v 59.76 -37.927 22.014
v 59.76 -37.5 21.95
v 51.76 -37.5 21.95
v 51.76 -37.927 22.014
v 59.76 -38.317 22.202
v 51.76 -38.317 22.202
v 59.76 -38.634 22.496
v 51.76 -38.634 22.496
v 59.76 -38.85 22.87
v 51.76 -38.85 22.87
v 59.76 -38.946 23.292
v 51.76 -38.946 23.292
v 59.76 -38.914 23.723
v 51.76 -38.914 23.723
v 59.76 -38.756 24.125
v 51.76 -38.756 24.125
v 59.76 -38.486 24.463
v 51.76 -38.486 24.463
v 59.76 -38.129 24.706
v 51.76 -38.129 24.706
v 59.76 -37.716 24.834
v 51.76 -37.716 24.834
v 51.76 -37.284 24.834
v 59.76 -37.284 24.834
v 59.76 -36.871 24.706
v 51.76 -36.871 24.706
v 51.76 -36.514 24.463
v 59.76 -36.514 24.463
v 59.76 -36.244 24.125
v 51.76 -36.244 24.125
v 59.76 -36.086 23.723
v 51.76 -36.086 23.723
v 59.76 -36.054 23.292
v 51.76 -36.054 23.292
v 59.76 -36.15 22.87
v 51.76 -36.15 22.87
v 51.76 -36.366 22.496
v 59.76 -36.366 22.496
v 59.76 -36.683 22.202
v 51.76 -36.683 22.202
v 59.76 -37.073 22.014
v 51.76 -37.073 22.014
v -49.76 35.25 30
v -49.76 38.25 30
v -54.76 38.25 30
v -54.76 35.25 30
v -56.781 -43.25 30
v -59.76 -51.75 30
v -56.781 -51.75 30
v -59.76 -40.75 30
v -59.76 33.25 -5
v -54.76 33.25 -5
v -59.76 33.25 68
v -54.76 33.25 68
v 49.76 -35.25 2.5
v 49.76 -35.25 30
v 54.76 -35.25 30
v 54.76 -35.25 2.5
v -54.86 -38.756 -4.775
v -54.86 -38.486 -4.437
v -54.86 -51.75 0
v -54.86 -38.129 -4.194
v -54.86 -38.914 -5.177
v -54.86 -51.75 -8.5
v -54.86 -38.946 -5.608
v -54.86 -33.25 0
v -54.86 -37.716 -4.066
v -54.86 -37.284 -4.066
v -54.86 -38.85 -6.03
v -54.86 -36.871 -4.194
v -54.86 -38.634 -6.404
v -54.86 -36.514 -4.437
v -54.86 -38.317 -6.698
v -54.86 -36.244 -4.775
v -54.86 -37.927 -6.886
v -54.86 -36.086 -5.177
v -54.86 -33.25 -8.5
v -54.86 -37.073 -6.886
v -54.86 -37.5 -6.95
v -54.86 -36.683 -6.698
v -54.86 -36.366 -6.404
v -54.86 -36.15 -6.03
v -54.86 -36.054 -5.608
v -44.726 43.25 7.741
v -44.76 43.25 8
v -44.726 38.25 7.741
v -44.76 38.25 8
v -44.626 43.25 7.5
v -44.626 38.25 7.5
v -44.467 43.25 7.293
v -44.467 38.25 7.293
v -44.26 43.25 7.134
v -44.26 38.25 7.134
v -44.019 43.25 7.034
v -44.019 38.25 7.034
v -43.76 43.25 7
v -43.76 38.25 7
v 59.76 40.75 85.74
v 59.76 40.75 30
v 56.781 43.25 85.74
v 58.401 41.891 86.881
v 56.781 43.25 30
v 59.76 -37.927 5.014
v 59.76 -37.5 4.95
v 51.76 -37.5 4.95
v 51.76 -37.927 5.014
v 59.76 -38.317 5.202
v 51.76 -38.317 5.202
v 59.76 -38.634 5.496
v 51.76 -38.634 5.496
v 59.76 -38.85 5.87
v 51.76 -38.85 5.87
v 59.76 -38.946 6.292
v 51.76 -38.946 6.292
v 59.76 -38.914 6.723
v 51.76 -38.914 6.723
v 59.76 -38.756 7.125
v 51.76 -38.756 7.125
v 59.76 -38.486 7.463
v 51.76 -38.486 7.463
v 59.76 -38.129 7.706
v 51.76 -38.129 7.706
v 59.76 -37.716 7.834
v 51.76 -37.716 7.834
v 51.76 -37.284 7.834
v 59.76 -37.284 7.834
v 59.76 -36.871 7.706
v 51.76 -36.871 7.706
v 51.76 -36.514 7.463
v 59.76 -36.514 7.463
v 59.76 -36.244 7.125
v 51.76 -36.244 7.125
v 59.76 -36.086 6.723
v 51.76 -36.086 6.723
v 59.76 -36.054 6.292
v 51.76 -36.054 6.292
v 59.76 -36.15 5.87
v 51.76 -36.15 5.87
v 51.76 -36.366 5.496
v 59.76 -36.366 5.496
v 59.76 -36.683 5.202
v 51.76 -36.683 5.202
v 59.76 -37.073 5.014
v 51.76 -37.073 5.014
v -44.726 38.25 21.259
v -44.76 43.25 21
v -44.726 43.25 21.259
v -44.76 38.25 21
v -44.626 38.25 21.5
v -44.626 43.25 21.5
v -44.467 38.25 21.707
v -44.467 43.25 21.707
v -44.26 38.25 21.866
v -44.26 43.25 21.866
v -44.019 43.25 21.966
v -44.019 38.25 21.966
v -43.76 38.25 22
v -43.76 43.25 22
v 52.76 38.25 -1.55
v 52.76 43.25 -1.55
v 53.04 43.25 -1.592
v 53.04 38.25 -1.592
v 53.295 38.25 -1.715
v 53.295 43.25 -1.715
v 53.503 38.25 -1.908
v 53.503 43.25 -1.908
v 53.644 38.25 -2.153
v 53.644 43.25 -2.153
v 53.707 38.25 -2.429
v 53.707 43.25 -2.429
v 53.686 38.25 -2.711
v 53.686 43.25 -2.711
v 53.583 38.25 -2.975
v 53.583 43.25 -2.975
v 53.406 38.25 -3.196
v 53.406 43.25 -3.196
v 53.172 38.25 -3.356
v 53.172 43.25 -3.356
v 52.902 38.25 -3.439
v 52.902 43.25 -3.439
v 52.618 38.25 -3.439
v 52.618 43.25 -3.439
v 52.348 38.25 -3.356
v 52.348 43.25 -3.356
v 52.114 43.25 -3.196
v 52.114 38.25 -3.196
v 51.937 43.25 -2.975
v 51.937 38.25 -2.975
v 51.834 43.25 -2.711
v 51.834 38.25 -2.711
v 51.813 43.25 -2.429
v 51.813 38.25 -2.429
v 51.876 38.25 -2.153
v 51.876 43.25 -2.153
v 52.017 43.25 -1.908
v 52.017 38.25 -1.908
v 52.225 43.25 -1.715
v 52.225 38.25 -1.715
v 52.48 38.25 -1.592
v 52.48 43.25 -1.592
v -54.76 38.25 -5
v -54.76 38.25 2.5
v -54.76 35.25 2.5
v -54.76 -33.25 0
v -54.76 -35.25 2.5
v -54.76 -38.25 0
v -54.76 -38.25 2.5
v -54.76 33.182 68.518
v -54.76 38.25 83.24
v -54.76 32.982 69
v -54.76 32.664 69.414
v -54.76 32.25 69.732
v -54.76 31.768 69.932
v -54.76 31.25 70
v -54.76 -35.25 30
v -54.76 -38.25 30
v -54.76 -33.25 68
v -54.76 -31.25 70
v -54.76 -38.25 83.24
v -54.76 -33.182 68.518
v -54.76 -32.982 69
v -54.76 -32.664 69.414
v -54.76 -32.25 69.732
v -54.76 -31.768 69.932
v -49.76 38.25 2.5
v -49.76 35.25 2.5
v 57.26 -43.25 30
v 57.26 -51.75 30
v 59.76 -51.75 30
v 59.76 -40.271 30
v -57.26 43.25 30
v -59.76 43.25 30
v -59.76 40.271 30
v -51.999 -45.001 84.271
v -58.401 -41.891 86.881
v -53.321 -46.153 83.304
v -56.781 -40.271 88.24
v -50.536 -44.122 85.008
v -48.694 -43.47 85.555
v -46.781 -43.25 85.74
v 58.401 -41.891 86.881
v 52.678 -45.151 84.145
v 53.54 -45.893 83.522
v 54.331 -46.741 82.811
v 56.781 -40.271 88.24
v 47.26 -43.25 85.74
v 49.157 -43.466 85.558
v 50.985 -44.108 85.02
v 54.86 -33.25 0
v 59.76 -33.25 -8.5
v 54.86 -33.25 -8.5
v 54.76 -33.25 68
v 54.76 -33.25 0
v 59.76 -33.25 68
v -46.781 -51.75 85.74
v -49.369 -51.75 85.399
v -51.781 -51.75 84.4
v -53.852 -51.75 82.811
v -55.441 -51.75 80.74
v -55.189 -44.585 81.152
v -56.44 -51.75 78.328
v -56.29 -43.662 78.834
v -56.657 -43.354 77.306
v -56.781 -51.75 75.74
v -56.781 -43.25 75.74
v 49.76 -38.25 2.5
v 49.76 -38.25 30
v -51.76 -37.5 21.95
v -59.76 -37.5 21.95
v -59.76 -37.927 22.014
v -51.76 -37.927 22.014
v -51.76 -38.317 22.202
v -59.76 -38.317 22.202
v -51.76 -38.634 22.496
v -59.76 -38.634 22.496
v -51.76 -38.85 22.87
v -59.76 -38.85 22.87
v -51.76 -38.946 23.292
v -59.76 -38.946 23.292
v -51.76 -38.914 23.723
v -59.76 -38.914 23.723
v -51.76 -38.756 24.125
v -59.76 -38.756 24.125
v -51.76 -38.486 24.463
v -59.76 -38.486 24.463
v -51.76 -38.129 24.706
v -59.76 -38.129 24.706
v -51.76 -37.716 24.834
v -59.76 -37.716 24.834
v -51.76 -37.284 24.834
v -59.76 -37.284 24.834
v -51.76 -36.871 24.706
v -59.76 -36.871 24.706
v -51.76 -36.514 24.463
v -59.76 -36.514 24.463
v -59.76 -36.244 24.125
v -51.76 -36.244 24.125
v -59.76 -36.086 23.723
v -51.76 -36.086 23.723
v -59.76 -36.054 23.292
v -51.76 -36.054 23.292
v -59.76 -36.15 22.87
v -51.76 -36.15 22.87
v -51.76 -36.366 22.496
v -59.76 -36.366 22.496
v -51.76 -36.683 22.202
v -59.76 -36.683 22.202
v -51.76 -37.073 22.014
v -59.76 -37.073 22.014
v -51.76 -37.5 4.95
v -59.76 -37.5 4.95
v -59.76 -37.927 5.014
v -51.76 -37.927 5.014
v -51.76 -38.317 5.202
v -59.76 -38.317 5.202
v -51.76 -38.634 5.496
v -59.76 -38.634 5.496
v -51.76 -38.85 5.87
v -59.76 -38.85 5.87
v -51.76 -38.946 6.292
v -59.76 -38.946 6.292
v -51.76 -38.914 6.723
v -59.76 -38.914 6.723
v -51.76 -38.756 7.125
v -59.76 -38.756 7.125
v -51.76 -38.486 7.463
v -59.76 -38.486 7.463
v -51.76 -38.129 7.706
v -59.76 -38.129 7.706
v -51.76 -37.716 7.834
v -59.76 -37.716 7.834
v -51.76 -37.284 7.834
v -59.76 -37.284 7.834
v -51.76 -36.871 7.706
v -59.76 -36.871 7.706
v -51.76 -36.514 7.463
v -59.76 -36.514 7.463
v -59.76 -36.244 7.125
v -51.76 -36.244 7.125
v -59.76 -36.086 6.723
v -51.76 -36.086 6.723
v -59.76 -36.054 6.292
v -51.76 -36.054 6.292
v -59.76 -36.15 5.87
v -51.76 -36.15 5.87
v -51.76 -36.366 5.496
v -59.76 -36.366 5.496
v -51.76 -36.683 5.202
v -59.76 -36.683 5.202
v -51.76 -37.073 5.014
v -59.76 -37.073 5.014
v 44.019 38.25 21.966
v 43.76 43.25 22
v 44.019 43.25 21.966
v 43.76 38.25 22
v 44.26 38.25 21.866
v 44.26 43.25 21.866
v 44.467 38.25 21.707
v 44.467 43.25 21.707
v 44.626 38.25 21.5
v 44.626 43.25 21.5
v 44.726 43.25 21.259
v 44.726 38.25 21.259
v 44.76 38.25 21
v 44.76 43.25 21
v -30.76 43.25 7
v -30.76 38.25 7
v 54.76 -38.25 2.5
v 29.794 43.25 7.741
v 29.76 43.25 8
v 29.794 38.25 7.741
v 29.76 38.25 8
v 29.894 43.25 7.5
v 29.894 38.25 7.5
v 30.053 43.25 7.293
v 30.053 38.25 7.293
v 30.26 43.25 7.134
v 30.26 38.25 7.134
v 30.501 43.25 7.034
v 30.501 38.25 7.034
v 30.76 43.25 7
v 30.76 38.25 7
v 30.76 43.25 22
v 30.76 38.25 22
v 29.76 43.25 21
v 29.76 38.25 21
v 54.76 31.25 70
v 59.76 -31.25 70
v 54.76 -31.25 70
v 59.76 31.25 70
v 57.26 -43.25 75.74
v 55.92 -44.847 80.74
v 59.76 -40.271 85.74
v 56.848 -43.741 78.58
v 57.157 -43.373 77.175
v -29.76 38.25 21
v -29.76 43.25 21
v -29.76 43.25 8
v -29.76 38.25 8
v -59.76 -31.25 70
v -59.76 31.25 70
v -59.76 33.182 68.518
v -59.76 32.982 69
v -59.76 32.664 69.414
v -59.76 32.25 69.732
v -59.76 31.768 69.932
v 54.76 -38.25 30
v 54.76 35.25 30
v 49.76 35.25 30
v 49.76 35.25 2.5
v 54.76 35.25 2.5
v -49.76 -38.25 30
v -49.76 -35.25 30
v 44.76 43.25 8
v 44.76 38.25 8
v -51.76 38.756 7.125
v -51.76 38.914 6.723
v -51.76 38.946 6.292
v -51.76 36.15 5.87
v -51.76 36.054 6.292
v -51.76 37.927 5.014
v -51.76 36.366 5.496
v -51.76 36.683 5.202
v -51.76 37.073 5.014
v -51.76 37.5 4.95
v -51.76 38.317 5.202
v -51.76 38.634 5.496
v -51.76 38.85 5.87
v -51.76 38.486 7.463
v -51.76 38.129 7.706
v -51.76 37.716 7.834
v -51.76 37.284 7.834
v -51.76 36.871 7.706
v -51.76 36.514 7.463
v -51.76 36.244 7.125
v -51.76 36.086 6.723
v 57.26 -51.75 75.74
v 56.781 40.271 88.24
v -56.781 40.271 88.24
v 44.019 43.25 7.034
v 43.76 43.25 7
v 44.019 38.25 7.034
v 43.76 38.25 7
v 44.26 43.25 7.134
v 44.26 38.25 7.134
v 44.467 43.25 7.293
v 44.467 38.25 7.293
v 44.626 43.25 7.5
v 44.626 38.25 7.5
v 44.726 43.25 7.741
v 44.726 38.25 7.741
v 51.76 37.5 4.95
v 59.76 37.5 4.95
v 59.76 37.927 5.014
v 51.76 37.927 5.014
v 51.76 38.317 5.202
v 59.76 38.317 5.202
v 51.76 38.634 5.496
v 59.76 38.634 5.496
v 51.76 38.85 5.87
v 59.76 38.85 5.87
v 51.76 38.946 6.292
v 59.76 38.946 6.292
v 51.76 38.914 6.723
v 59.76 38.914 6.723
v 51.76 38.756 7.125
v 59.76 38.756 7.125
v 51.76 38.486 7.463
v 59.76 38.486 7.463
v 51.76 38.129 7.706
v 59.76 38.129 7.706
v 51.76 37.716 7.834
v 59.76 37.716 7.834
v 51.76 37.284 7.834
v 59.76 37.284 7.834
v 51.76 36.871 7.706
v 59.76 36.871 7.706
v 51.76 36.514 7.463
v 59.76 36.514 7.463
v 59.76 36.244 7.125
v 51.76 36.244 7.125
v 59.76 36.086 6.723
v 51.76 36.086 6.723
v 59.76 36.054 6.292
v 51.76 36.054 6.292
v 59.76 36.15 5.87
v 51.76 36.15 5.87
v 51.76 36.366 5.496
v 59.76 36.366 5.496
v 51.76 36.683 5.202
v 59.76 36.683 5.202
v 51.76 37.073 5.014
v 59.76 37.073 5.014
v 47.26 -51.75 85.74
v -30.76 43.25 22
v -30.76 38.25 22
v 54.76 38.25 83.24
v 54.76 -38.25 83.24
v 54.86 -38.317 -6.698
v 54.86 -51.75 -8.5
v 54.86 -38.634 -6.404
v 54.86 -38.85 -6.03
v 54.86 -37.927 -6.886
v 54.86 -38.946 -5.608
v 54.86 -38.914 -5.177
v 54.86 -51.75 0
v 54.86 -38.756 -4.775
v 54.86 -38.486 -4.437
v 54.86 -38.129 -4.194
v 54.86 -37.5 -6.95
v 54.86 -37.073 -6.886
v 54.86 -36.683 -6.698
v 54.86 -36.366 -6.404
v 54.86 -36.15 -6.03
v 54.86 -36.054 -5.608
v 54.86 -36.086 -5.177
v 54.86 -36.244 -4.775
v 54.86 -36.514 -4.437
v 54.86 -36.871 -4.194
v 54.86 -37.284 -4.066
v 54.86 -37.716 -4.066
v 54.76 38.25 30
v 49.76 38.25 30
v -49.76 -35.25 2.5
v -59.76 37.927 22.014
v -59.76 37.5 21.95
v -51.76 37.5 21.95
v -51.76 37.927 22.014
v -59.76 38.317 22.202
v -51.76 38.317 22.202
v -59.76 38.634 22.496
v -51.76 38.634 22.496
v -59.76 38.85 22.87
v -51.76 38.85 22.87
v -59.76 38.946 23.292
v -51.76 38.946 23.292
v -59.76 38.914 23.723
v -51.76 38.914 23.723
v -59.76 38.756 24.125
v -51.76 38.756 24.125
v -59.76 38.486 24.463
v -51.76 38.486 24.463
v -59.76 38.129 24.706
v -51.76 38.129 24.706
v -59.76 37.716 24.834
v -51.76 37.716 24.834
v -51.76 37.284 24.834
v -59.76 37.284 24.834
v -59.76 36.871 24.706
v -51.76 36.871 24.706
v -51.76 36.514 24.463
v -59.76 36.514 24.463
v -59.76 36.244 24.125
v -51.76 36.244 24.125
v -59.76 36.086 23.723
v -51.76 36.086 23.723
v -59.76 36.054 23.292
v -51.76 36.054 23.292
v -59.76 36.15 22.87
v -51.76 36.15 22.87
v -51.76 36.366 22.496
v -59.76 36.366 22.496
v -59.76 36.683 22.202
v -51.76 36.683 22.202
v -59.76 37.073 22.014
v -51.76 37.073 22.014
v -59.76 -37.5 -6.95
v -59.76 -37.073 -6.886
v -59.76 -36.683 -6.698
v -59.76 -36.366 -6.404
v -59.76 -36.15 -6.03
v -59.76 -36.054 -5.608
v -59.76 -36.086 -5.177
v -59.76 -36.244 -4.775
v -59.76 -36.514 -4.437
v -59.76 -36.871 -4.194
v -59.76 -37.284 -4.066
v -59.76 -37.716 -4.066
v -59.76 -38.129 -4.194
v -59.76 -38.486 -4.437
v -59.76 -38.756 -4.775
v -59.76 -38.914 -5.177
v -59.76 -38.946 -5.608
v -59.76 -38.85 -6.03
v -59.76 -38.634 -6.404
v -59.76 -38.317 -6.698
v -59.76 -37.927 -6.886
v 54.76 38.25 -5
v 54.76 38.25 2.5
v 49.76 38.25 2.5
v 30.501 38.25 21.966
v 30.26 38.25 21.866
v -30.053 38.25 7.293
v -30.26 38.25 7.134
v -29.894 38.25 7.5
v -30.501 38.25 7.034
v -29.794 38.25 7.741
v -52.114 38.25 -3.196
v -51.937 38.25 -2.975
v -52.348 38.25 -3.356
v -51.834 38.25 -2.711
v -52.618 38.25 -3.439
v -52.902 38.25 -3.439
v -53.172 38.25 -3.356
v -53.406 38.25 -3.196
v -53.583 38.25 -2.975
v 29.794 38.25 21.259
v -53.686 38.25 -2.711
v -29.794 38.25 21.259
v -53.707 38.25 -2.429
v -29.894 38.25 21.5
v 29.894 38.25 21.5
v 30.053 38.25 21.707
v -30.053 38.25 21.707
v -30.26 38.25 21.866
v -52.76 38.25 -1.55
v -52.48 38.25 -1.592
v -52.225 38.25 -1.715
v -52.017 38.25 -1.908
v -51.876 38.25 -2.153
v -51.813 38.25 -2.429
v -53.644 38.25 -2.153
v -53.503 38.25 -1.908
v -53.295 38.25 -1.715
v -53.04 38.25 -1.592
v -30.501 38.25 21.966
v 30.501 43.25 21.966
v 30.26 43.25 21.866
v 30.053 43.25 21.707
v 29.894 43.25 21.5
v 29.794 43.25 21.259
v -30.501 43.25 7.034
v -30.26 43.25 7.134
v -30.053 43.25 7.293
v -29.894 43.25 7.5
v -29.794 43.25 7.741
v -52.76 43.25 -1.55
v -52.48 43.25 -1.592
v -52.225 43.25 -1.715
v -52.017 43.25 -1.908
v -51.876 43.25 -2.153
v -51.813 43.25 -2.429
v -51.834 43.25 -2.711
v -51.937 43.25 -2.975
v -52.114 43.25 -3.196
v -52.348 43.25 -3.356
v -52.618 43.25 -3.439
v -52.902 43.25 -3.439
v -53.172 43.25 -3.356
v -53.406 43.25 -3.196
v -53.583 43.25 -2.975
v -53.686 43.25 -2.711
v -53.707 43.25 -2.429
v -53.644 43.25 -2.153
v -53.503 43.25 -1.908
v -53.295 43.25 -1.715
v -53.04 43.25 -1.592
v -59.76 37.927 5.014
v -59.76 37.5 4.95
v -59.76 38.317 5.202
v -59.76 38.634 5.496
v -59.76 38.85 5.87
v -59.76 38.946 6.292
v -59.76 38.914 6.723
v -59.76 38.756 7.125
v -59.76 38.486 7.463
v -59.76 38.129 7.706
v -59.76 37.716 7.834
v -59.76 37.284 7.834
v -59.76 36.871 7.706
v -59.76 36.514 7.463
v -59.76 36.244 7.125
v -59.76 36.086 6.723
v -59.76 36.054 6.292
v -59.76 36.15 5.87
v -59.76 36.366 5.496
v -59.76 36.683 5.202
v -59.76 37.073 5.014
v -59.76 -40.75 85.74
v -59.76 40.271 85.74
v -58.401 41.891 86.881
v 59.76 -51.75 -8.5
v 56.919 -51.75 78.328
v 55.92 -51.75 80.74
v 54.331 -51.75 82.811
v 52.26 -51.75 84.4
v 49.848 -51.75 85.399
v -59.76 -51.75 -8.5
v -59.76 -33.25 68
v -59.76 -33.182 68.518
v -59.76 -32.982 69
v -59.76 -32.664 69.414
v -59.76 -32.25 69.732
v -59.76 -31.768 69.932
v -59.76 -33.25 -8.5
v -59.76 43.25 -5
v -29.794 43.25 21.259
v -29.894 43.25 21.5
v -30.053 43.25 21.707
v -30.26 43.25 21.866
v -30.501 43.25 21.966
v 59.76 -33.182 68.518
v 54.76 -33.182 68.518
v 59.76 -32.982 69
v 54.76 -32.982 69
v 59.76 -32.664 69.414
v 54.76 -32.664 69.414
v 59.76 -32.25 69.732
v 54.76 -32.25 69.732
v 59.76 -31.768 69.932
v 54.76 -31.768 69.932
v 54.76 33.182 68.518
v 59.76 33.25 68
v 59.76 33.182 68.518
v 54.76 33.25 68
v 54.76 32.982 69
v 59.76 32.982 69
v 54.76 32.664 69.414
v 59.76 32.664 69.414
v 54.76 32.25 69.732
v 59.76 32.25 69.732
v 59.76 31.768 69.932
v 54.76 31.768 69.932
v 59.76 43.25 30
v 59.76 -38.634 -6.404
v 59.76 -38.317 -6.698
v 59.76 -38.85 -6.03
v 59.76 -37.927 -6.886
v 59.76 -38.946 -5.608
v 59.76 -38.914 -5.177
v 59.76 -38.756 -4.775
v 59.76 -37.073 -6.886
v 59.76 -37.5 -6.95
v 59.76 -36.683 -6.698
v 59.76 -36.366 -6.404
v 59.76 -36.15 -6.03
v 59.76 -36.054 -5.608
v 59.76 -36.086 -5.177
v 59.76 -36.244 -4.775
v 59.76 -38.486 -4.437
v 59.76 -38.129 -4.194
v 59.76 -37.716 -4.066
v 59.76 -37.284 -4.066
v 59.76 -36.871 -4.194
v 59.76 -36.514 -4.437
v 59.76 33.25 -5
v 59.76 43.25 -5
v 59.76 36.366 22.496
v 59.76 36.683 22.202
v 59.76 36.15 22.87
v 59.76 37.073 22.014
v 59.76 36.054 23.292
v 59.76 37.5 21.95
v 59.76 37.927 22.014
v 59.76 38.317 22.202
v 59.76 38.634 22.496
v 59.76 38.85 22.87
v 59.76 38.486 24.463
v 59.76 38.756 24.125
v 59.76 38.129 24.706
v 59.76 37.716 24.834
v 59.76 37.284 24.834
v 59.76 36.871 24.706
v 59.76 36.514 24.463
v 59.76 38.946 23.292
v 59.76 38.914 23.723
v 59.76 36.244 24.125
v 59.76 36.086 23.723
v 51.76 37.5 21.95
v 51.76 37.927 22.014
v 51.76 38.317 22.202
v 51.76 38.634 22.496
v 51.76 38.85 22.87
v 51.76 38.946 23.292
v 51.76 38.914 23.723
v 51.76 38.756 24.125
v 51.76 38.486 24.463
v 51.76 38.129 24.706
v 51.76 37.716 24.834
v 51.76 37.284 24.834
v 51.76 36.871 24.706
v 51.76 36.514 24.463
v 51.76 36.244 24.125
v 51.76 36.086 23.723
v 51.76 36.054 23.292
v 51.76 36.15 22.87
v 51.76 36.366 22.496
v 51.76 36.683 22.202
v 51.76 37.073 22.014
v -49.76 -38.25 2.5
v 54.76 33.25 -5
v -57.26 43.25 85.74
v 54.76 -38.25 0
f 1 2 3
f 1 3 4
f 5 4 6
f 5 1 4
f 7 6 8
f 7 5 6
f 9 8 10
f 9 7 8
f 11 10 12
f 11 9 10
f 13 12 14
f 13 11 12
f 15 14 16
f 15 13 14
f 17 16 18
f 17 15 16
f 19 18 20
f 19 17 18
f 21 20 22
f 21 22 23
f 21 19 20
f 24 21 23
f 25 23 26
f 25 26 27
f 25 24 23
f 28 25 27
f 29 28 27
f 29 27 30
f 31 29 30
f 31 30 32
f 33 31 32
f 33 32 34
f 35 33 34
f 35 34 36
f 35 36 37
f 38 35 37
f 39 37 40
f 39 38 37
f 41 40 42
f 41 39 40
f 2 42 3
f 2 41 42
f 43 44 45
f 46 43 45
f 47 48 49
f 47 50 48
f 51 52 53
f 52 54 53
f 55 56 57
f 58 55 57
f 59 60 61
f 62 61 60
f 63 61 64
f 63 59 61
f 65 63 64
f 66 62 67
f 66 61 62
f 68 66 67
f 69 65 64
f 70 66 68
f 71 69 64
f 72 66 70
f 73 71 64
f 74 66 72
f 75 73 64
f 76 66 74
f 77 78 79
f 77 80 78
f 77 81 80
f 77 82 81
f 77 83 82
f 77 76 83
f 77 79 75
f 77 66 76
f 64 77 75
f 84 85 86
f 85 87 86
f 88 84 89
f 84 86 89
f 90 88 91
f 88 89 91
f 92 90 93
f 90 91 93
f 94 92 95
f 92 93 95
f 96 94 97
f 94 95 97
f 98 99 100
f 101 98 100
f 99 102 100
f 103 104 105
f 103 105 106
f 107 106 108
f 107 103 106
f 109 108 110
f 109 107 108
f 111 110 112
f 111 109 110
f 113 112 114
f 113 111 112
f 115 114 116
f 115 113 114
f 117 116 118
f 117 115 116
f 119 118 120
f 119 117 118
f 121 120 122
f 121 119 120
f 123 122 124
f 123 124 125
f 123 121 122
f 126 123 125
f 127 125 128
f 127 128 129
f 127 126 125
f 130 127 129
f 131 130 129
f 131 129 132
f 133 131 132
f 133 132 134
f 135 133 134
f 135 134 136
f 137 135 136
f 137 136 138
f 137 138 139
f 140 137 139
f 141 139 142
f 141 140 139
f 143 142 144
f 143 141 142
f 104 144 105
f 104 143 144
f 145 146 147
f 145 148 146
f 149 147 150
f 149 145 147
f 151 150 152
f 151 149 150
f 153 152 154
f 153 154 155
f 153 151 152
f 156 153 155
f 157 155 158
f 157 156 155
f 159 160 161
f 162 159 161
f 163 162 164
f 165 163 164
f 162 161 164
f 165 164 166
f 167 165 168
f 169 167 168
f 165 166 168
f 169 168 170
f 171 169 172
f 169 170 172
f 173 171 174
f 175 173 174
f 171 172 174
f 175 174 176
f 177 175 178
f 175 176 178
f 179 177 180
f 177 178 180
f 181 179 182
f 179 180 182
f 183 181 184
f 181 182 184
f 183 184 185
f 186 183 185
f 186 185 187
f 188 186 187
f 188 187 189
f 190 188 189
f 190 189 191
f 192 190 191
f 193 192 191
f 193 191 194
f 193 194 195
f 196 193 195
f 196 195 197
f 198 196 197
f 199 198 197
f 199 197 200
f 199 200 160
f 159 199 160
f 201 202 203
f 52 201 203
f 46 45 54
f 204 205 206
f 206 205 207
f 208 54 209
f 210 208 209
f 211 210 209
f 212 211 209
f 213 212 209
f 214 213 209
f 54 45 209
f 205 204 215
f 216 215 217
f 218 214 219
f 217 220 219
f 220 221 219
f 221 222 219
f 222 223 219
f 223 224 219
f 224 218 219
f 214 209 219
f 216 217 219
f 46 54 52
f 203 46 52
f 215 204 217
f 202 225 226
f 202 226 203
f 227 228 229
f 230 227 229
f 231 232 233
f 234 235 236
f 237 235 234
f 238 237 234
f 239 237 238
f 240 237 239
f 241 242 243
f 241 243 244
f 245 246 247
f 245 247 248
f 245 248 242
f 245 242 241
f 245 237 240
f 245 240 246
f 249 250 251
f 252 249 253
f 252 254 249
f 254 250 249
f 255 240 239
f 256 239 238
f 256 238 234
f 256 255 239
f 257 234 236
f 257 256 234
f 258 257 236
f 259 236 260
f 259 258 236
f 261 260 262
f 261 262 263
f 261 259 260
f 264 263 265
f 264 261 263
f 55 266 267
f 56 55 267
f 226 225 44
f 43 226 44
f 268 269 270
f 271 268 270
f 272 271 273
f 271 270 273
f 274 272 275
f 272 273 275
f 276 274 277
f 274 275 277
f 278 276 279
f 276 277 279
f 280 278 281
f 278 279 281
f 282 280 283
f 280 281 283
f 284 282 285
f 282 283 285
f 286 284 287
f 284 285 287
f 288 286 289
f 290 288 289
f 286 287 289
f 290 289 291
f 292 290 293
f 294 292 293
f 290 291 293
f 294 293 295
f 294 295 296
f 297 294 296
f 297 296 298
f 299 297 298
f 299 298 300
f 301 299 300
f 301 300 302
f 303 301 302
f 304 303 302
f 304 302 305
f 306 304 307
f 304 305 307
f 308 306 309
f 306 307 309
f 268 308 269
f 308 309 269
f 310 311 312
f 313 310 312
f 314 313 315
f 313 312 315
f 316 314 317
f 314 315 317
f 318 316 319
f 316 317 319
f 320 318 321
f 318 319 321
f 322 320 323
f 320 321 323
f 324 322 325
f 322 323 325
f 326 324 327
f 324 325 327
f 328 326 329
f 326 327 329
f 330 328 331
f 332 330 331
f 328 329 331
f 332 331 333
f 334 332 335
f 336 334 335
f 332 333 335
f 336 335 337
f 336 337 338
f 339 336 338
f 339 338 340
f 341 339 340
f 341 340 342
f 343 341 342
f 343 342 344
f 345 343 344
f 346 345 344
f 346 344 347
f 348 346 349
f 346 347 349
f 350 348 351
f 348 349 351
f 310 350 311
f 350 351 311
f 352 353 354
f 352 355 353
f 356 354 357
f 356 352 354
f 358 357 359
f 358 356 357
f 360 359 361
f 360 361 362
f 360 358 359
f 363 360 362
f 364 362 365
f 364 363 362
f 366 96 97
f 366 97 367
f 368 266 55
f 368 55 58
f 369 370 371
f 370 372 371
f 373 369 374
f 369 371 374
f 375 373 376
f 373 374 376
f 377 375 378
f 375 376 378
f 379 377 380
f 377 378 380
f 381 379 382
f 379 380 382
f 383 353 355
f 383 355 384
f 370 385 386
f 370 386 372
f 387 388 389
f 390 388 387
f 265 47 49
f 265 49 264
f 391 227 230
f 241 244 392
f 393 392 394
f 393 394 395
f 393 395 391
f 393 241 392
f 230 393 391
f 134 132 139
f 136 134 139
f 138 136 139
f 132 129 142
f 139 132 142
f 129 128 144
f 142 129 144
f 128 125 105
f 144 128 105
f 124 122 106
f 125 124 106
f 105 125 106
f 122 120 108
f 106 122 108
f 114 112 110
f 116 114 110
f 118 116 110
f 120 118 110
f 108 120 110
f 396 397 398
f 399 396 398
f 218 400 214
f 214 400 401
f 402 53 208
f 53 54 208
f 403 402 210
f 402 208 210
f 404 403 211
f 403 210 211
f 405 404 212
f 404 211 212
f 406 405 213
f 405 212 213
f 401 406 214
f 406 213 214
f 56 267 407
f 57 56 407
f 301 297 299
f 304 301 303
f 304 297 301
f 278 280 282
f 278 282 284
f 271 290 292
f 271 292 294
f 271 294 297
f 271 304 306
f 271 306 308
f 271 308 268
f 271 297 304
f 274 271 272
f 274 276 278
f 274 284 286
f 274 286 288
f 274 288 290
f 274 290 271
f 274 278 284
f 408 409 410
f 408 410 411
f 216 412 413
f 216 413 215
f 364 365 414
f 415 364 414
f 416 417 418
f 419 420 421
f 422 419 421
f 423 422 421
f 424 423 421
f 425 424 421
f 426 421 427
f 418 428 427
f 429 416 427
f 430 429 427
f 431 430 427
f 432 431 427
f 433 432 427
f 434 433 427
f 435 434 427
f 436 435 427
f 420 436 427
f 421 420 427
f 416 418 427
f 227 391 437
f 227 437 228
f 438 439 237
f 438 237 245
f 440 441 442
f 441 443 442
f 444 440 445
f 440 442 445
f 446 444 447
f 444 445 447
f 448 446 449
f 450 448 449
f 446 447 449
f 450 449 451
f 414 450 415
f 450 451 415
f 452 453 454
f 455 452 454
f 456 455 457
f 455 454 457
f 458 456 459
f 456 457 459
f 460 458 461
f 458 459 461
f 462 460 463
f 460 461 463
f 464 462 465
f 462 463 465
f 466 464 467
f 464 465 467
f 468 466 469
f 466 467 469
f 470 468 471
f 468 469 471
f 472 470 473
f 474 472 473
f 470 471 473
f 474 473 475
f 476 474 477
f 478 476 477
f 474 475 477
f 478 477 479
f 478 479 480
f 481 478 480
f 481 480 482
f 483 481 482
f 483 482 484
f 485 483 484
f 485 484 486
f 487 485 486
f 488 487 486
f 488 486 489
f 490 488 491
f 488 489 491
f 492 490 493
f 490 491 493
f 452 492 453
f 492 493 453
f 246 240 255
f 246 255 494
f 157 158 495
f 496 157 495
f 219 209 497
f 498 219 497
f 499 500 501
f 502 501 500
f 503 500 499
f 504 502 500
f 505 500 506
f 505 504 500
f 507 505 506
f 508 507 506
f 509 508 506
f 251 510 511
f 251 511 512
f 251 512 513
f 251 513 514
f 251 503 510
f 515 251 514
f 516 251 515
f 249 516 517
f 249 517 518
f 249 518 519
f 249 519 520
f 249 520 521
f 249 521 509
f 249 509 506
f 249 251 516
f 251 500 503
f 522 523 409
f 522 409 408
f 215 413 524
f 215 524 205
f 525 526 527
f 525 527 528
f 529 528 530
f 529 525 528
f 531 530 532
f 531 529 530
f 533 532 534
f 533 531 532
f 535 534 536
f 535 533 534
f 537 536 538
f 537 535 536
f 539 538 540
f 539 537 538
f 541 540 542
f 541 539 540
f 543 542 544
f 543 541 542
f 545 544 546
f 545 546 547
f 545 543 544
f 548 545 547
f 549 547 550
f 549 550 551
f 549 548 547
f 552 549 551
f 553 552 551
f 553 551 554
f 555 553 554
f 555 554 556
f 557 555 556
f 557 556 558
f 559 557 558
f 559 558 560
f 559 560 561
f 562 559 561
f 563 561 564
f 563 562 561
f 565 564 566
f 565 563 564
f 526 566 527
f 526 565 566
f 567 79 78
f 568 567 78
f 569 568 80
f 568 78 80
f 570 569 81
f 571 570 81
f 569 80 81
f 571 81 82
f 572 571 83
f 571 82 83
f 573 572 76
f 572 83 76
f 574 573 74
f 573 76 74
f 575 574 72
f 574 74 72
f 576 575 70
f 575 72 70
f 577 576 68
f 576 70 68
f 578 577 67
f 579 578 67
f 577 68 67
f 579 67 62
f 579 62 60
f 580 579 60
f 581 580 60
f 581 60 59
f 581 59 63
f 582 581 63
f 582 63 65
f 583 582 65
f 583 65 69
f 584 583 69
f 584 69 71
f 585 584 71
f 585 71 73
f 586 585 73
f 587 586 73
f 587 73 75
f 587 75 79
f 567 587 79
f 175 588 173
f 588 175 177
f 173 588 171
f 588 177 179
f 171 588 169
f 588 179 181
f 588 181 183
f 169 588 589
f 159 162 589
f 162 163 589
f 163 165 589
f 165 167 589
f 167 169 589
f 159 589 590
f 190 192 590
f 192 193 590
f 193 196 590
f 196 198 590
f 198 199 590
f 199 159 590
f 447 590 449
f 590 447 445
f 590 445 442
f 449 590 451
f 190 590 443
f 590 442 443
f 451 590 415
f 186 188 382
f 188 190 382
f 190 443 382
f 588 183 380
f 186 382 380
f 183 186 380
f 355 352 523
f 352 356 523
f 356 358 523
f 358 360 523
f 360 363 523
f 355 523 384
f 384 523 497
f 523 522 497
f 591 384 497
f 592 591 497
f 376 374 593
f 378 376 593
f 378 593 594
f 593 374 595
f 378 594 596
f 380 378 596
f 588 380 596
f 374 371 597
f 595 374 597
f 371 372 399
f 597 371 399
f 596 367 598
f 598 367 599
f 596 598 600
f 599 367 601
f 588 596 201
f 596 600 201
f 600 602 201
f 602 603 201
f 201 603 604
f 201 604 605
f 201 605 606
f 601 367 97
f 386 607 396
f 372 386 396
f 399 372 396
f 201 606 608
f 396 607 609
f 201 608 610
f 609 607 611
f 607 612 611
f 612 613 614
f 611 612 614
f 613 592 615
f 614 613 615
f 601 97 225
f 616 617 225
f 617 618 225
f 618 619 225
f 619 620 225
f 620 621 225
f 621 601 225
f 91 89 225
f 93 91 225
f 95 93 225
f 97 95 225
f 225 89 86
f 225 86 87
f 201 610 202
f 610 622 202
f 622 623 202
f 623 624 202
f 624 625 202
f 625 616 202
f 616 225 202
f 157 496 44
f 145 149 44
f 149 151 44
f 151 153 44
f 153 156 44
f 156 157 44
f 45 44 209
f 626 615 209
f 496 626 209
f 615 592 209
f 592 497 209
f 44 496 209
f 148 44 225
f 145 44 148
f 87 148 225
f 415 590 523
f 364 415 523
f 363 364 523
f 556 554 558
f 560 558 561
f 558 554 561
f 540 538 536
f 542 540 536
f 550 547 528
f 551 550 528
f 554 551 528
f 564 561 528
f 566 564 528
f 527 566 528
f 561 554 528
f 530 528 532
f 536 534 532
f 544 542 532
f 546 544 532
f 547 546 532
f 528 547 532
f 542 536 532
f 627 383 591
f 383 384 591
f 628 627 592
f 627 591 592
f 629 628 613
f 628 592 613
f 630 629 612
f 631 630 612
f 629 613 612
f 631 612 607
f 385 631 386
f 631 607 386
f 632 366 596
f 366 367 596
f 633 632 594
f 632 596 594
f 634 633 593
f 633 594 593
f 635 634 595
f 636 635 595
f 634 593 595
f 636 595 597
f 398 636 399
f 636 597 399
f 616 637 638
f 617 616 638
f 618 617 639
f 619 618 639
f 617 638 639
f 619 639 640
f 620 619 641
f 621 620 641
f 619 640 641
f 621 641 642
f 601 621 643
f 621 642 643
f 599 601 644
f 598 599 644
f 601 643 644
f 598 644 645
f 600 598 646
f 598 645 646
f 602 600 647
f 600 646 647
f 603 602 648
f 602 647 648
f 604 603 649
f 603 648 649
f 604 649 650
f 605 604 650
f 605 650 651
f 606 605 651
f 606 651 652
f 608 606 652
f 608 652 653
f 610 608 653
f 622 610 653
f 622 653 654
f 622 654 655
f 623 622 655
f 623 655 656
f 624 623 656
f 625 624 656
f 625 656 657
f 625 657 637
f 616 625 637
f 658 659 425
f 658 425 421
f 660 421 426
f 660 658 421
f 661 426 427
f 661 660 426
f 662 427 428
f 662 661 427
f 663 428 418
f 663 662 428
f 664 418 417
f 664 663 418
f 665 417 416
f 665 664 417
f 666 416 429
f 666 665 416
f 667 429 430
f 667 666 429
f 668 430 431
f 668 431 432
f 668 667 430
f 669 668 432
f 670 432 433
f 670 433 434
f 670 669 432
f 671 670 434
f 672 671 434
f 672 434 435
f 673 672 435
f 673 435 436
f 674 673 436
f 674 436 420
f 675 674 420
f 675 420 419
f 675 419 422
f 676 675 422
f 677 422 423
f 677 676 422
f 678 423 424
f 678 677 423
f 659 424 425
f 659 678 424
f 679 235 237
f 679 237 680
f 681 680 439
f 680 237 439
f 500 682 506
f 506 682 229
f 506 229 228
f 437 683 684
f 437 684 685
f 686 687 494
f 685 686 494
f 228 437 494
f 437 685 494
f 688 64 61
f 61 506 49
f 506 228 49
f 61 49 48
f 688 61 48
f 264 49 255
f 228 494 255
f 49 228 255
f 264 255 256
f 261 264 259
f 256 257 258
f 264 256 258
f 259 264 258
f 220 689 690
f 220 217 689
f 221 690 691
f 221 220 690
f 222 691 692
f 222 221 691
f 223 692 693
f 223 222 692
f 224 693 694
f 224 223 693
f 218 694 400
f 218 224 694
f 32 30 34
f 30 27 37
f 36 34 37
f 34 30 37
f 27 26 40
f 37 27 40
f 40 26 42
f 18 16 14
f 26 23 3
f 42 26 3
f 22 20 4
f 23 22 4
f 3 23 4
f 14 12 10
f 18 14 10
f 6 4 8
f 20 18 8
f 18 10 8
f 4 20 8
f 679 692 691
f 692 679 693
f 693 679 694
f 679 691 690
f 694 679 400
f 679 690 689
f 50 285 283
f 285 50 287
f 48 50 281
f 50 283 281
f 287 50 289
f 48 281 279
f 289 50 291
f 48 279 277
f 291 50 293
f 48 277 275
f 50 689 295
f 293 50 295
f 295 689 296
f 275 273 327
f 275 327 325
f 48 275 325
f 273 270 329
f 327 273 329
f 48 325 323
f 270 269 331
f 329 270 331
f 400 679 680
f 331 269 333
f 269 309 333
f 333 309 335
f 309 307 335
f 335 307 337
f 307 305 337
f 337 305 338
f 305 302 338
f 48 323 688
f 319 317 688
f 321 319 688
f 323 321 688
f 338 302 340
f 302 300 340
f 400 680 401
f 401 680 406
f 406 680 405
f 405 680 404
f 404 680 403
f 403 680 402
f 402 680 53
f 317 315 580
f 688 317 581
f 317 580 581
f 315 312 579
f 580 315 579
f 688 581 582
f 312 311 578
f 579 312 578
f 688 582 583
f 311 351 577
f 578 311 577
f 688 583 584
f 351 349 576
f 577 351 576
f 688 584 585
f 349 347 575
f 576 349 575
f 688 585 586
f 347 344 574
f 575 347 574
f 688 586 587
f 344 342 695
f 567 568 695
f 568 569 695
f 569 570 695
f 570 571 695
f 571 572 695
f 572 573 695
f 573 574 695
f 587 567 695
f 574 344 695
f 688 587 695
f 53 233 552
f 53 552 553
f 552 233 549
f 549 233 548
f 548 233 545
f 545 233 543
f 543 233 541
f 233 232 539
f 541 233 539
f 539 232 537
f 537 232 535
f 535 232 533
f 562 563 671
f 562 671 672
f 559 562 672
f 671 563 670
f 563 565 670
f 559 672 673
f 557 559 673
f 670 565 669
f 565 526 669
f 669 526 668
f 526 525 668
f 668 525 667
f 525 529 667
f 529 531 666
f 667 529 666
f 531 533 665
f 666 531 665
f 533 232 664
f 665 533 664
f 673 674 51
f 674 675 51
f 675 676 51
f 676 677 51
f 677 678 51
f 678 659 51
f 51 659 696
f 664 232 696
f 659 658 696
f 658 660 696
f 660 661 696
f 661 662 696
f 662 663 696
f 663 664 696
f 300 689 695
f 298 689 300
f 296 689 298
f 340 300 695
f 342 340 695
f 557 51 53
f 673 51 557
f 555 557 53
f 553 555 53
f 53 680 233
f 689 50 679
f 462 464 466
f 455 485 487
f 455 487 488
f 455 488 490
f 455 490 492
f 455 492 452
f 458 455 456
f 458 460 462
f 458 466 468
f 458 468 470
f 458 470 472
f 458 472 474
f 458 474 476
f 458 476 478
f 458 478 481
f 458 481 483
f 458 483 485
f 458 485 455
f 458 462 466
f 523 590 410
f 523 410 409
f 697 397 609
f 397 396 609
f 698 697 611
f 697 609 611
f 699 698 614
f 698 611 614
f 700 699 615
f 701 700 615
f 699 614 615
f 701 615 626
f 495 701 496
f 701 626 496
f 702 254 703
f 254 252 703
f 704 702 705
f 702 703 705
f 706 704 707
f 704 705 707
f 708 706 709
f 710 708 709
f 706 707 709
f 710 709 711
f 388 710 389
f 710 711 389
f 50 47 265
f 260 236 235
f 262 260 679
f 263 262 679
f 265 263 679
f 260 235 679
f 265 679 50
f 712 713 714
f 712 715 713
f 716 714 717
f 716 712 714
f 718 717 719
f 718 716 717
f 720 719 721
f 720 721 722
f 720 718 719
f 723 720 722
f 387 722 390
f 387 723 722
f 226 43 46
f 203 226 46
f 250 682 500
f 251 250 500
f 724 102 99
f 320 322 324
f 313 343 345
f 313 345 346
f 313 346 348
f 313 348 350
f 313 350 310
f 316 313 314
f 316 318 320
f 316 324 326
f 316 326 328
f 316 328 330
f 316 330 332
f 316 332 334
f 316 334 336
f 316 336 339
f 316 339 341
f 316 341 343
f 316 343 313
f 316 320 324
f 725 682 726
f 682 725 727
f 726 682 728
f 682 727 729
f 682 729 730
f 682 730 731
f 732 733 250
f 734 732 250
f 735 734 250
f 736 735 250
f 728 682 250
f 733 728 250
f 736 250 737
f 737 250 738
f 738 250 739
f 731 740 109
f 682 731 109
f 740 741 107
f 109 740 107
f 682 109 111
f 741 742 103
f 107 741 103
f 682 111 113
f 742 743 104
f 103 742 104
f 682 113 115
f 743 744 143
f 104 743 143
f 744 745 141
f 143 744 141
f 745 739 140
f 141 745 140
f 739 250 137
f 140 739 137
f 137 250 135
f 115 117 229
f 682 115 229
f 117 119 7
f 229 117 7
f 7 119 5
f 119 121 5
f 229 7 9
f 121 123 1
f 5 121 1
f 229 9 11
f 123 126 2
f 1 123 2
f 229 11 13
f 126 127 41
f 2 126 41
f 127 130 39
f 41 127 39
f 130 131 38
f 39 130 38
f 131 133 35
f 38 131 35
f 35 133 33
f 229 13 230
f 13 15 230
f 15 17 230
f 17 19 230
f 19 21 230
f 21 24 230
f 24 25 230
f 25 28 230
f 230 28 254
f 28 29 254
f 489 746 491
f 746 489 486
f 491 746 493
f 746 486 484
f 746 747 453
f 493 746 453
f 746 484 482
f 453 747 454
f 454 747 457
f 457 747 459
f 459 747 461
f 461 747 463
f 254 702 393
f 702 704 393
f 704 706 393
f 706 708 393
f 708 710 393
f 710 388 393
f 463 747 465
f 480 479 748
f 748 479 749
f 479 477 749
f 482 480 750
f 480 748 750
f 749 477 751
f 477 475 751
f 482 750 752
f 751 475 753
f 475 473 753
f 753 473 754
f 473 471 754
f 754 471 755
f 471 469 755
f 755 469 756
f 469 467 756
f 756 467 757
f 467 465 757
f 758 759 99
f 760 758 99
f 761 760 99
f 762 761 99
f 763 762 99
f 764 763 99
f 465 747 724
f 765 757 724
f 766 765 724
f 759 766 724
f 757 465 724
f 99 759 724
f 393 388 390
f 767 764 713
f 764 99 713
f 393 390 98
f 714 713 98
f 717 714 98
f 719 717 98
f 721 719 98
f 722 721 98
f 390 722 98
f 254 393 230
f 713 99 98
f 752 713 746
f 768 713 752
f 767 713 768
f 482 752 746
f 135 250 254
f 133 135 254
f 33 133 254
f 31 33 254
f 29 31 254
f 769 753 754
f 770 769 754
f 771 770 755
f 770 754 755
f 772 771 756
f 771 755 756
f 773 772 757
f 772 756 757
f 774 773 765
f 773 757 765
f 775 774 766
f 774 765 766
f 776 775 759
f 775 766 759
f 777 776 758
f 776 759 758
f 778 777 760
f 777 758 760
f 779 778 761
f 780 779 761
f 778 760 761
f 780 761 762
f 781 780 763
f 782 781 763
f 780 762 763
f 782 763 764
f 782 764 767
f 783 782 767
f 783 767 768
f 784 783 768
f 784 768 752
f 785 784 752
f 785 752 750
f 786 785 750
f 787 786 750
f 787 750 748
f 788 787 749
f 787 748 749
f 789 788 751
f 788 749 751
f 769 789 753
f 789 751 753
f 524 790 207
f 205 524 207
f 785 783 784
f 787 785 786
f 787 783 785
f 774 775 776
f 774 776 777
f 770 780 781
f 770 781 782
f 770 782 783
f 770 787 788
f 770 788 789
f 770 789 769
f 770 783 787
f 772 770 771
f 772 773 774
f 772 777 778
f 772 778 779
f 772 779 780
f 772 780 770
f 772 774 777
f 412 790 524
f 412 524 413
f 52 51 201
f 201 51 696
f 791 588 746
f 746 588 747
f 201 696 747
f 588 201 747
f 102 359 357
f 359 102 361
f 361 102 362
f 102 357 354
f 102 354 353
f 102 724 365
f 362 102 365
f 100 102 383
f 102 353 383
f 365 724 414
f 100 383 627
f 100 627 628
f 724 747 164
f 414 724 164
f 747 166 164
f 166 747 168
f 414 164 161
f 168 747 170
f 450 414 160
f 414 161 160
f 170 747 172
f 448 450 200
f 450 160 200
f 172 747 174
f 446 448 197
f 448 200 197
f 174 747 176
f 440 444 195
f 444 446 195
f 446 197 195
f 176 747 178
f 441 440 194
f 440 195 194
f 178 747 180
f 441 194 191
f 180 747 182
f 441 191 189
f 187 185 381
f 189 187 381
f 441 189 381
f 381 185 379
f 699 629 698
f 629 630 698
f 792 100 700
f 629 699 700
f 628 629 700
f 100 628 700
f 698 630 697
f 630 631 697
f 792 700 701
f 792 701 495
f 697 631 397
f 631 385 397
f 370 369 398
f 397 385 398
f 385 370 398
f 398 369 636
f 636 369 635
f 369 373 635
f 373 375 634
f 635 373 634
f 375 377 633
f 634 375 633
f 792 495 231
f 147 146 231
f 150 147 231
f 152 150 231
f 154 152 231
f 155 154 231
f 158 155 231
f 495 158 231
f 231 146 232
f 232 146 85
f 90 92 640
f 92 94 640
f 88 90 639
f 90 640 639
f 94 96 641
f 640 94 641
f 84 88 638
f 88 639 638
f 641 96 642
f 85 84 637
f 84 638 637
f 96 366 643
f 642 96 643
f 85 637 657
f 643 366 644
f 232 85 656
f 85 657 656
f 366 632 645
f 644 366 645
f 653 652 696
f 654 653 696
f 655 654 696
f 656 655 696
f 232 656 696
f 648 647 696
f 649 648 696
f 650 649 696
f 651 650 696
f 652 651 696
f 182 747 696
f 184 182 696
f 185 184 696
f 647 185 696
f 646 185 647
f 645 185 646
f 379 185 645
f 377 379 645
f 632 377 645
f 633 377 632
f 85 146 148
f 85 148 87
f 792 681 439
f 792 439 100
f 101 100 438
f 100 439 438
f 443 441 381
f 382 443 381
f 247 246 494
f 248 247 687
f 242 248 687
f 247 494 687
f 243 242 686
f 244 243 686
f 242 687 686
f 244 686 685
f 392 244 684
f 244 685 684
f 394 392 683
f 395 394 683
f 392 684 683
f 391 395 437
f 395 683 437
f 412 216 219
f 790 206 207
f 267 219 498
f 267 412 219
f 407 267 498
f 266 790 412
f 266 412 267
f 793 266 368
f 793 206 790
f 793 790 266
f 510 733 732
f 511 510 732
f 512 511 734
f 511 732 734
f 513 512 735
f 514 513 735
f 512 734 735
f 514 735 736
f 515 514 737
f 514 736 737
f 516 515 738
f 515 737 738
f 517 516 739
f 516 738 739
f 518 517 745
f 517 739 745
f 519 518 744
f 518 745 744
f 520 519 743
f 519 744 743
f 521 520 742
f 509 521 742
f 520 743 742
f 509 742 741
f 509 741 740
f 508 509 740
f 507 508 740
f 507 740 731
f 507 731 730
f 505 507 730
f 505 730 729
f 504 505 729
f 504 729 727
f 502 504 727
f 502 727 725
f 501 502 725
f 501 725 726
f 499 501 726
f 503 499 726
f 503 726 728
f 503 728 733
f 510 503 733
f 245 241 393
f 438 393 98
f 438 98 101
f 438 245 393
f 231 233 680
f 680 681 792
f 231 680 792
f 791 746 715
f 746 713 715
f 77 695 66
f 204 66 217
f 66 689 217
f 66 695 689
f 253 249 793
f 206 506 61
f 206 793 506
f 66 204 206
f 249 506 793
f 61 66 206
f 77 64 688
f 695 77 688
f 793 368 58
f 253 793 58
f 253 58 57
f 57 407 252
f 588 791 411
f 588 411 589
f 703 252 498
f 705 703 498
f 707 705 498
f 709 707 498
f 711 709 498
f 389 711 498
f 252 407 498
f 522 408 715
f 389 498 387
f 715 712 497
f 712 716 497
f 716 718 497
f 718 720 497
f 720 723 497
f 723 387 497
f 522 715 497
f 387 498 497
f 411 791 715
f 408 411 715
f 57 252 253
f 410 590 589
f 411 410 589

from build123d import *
from OCP.BRepFilletAPI import BRepFilletAPI_MakeChamfer

# Parameters (mm, degrees)
SKETCH1_W                                  = 119.52
SKETCH1_H                                  = 86.5
BOSS_EXTRUDE1_DEPTH                        = 88.24
SHELL1_T                                   = -5
CHAMFER1_SIZE                              = 2.5
CHAMFER1_SIZE2                             = 2.979383981
CHAMFER2_SIZE                              = 2.5
CHAMFER2_SIZE2                             = 2.979383981
CHAMFER3_SIZE                              = 2.5
CHAMFER3_SIZE2                             = 2.979383981
CUT_EXTRUDE1_REACH                         = 156.732
SKETCH3_W                                  = 70
SKETCH3_H                                  = 66.5
FILLET1_R                                  = 2
FILLET1_OF_MIRROR1_R                       = 2
SKETCH4_W                                  = 109.52
SKETCH4_H                                  = 5
BOSS_EXTRUDE2_DEPTH                        = 5
CUT_EXTRUDE2_REACH                         = 139.258
SKETCH5_R                                  = 0.95
BOSS_EXTRUDE3_DEPTH                        = 8.5
BOSS_EXTRUDE4_DEPTH                        = 5
BOSS_EXTRUDE6_DEPTH                        = 35
BOSS_EXTRUDE7_DEPTH                        = 8.5
BOSS_EXTRUDE8_DEPTH                        = 35
BOSS_EXTRUDE9_DEPTH                        = 38.5
SKETCH16_W                                 = 5
SKETCH16_H                                 = 27.5
BOSS_EXTRUDE10_DEPTH                       = 3
MIRROR7_COPY_1_SKETCH_W                    = 5
MIRROR7_COPY_1_SKETCH_H                    = 27.5
MIRROR7_COPY_1_DEPTH                       = 3
SKETCH15_R                                 = 1.45
CUT_EXTRUDE5_DEPTH                         = 8
MIRROR8_AT_THE_SECOND_PLANE_COPY_1_SKETC_R = 1.45
MIRROR8_AT_THE_SECOND_PLANE_COPY_1_DEPTH   = 8
SKETCH17_R                                 = 1.45
CUT_EXTRUDE6_DEPTH                         = 8
SKETCH18_R                                 = 1.45
CUT_EXTRUDE7_DEPTH                         = 8
SKETCH19_W                                 = 15
SKETCH19_H                                 = 15
CUT_EXTRUDE8_DEPTH                         = 5
FILLET2_R                                  = 1
FILLET2_OF_MIRROR10_R                      = 1
BOSS_EXTRUDE11_DEPTH                       = 8.5
FILLET3_R                                  = 10


with BuildPart() as part:
    # Sketch1 → Boss-Extrude1 (new body)
    with BuildSketch(Plane.XY):
        Rectangle(SKETCH1_W, SKETCH1_H)
    extrude(amount=BOSS_EXTRUDE1_DEPTH)

    # Shell1
    shell1_openings = [part.faces().sort_by_distance(p)[0] for p in [
        (0, 0, 0),
    ]]
    offset(amount=SHELL1_T, openings=shell1_openings, kind=Kind.INTERSECTION)

    # Chamfer1: one chamfer whose edges measure the first distance from different faces: ONE call of the kernel's chamfer builder (chamfer() names one face for all edges)
    chamfer1_edges_1 = [part.edges().sort_by_distance(p)[0] for p in [
        (59.76, 0, 88.24),
    ]]
    chamfer1_side_1 = [part.faces().sort_by_distance(p)[0] for p in [
        (59.76, 0, 44.12),
    ]]
    chamfer1_edges_2 = [part.edges().sort_by_distance(p)[0] for p in [
        (0, 43.25, 88.24),
    ]]
    chamfer1_side_2 = [part.faces().sort_by_distance(p)[0] for p in [
        (0, 43.25, 44.12),
    ]]
    chamfer1_edges_3 = [part.edges().sort_by_distance(p)[0] for p in [
        (-59.76, 0, 88.24),
    ]]
    chamfer1_side_3 = [part.faces().sort_by_distance(p)[0] for p in [
        (-59.76, 0, 44.12),
    ]]
    chamfer1_edges_4 = [part.edges().sort_by_distance(p)[0] for p in [
        (0, -43.25, 88.24),
    ]]
    chamfer1_side_4 = [part.faces().sort_by_distance(p)[0] for p in [
        (0, -43.25, 44.12),
    ]]
    chamfer1 = BRepFilletAPI_MakeChamfer(part.part.solid().wrapped)
    for e in chamfer1_edges_1:
        chamfer1.Add(CHAMFER1_SIZE, CHAMFER1_SIZE2, e.wrapped, chamfer1_side_1[0].wrapped)  # the first distance lies on this face
    for e in chamfer1_edges_2:
        chamfer1.Add(CHAMFER1_SIZE, CHAMFER1_SIZE2, e.wrapped, chamfer1_side_2[0].wrapped)  # the first distance lies on this face
    for e in chamfer1_edges_3:
        chamfer1.Add(CHAMFER1_SIZE, CHAMFER1_SIZE2, e.wrapped, chamfer1_side_3[0].wrapped)  # the first distance lies on this face
    for e in chamfer1_edges_4:
        chamfer1.Add(CHAMFER1_SIZE, CHAMFER1_SIZE2, e.wrapped, chamfer1_side_4[0].wrapped)  # the first distance lies on this face
    add(Compound.cast(chamfer1.Shape()), mode=Mode.REPLACE)

    # Chamfer2
    chamfer2_edges = [part.edges().sort_by_distance(p)[0] for p in [
        (-59.76, 43.25, 42.87),
    ]]
    chamfer2_side = [part.faces().sort_by_distance(p)[0] for p in [
        (0, 43.25, 42.87),
    ]]
    chamfer(chamfer2_edges, length=CHAMFER2_SIZE, length2=CHAMFER2_SIZE2, reference=chamfer2_side[0])

    # Chamfer3: one chamfer whose edges measure the first distance from different faces: ONE call of the kernel's chamfer builder (chamfer() names one face for all edges)
    chamfer3_edges_1 = [part.edges().sort_by_distance(p)[0] for p in [
        (59.76, -43.25, 42.87),
    ]]
    chamfer3_side_1 = [part.faces().sort_by_distance(p)[0] for p in [
        (0, -43.25, 42.87),
    ]]
    chamfer3_edges_2 = [part.edges().sort_by_distance(p)[0] for p in [
        (-59.76, -43.25, 42.87),
    ]]
    chamfer3_side_2 = [part.faces().sort_by_distance(p)[0] for p in [
        (-59.76, -1.489691991, 42.87),
    ]]
    chamfer3_edges_3 = [part.edges().sort_by_distance(p)[0] for p in [
        (59.76, 43.25, 42.87),
    ]]
    chamfer3_side_3 = [part.faces().sort_by_distance(p)[0] for p in [
        (59.76, 0, 42.87),
    ]]
    chamfer3 = BRepFilletAPI_MakeChamfer(part.part.solid().wrapped)
    for e in chamfer3_edges_1:
        chamfer3.Add(CHAMFER3_SIZE, CHAMFER3_SIZE2, e.wrapped, chamfer3_side_1[0].wrapped)  # the first distance lies on this face
    for e in chamfer3_edges_2:
        chamfer3.Add(CHAMFER3_SIZE, CHAMFER3_SIZE2, e.wrapped, chamfer3_side_2[0].wrapped)  # the first distance lies on this face
    for e in chamfer3_edges_3:
        chamfer3.Add(CHAMFER3_SIZE, CHAMFER3_SIZE2, e.wrapped, chamfer3_side_3[0].wrapped)  # the first distance lies on this face
    add(Compound.cast(chamfer3.Shape()), mode=Mode.REPLACE)

    # Sketch3 → Cut-Extrude1 (cut, up to next)
    with BuildSketch(Plane(origin=(59.76, 0, 0), x_dir=(0, 0, -1), z_dir=(1, 0, 0)), mode=Mode.PRIVATE) as cut_extrude1_sk1:
        with Locations((-35, 0)):
            Rectangle(SKETCH3_W, SKETCH3_H)
    cut_extrude1_tool1 = extrude(cut_extrude1_sk1.sketch, amount=-CUT_EXTRUDE1_REACH, mode=Mode.PRIVATE) & part.part
    cut_extrude1 = cut_extrude1_tool1.solids().sort_by_distance((59.76, 0, 35))[0]
    add(cut_extrude1, mode=Mode.SUBTRACT)

    # Fillet1
    fillet1_edges = [part.edges().sort_by_distance(p)[0] for p in [
        (57.26, -33.25, 70),
        (57.26, 33.25, 70),
    ]]
    fillet(fillet1_edges, radius=FILLET1_R)

    # Mirror1: Cut-Extrude1 across plane
    add(cut_extrude1.mirror(Plane(origin=(0, 0, 0), x_dir=(0, 0, 1), z_dir=(1, 0, 0))), mode=Mode.SUBTRACT)

    # Fillet1 of Mirror1
    fillet1_of_mirror1_edges = [part.edges().sort_by_distance(p)[0] for p in [
        (-57.26, -33.25, 70),
        (-57.26, 33.25, 70),
    ]]
    fillet(fillet1_of_mirror1_edges, radius=FILLET1_OF_MIRROR1_R)

    # Sketch4 → Boss-Extrude2 (add)
    with BuildSketch(Plane(origin=(0, 0, 0), x_dir=(-1, 0, 0), z_dir=(0, 0, -1))):
        with Locations((0, 40.75)):
            Rectangle(SKETCH4_W, SKETCH4_H)
    extrude(amount=BOSS_EXTRUDE2_DEPTH)

    # Sketch5 → Cut-Extrude2 (cut, up to next)
    with BuildSketch(Plane(origin=(0, 43.25, 0), x_dir=(1, 0, 0), z_dir=(0, 1, 0)), mode=Mode.PRIVATE) as cut_extrude2_sk1:
        with Locations(Location((-52.76, 2.5, 0), (0, 0, 270))):
            Circle(SKETCH5_R)
    cut_extrude2_tool1 = extrude(cut_extrude2_sk1.sketch, amount=-CUT_EXTRUDE2_REACH, mode=Mode.PRIVATE) & part.part
    # Sketch5 → Cut-Extrude2 (cut, up to next)
    with BuildSketch(Plane(origin=(0, 43.25, 0), x_dir=(1, 0, 0), z_dir=(0, 1, 0)), mode=Mode.PRIVATE) as cut_extrude2_sk2:
        with Locations(Location((52.76, 2.5, 0), (0, 0, 270))):
            Circle(SKETCH5_R)
    cut_extrude2_tool2 = extrude(cut_extrude2_sk2.sketch, amount=-CUT_EXTRUDE2_REACH, mode=Mode.PRIVATE) & part.part
    add(cut_extrude2_tool1.solids().sort_by_distance((-52.76, 43.25, -2.5))[0], mode=Mode.SUBTRACT)
    add(cut_extrude2_tool2.solids().sort_by_distance((52.76, 43.25, -2.5))[0], mode=Mode.SUBTRACT)

    # Sketch6 → Boss-Extrude3 (add)
    with BuildSketch(Plane(origin=(0, 0, 0), x_dir=(-1, 0, 0), z_dir=(0, 0, -1))):
        Polygon((-59.76, -33.25), (-54.86, -33.25), (-54.86, -43.25), (-57.26, -43.25), (-59.76, -40.270616019), align=None)
    extrude(amount=BOSS_EXTRUDE3_DEPTH)

    # Sketch8 → Boss-Extrude4 (add)
    with BuildSketch(Plane(origin=(0, 0, 0), x_dir=(-1, 0, 0), z_dir=(0, 0, -1))):
        Polygon((57.26, 43.25), (54.76, 43.25), (54.76, 38.25), (54.76, 33.25), (59.76, 33.25), (59.76, 40.270616019), align=None)
        Polygon((-54.76, 33.25), (-54.76, 38.25), (-54.76, 43.25), (-56.780616019, 43.25), (-59.76, 40.75), (-59.76, 33.25), align=None)
    extrude(amount=BOSS_EXTRUDE4_DEPTH)

    # Sketch10 → Boss-Extrude6 (add)
    with BuildSketch(Plane(origin=(0, 0, -5), x_dir=(-1, 0, 0), z_dir=(0, 0, -1))):
        Polygon((-59.76, 40.75), (-59.76, 43.25), (-56.780616019, 43.25), align=None)
    extrude(amount=-BOSS_EXTRUDE6_DEPTH)

    # Sketch11 → Boss-Extrude7 (add)
    with BuildSketch(Plane(origin=(0, 0, 0), x_dir=(-1, 0, 0), z_dir=(0, 0, -1))):
        Polygon((59.76, -33.25), (54.86, -33.25), (54.86, -43.25), (56.780616019, -43.25), (59.76, -40.75), align=None)
    extrude(amount=BOSS_EXTRUDE7_DEPTH)

    # Sketch13 → Boss-Extrude8 (add)
    with BuildSketch(Plane(origin=(0, 0, -5), x_dir=(-1, 0, 0), z_dir=(0, 0, -1))):
        Polygon((57.26, 43.25), (59.76, 43.25), (59.76, 40.270616019), align=None)
    extrude(amount=-BOSS_EXTRUDE8_DEPTH)

    # Sketch14 → Boss-Extrude9 (add)
    with BuildSketch(Plane(origin=(0, 0, -8.5), x_dir=(-1, 0, 0), z_dir=(0, 0, -1))):
        Polygon((-59.76, -40.270616019), (-59.76, -43.25), (-57.26, -43.25), align=None)
        Polygon((59.76, -40.75), (59.76, -43.25), (56.780616019, -43.25), align=None)
    extrude(amount=-BOSS_EXTRUDE9_DEPTH)

    # Sketch16 → Boss-Extrude10 (add)
    with BuildSketch(Plane.XZ.offset(-38.25)):
        with Locations((52.26, 16.25)):
            Rectangle(SKETCH16_W, SKETCH16_H)
    boss_extrude10 = extrude(amount=BOSS_EXTRUDE10_DEPTH)

    # Mirror6: Boss-Extrude10 across plane
    add(boss_extrude10.mirror(Plane(origin=(0, 0, 0), x_dir=(0, 0, 1), z_dir=(1, 0, 0))))

    # Mirror7: Boss-Extrude10 across plane
    add(boss_extrude10.mirror(Plane.ZX))

    # Mirror7 copy 1 sketch → Mirror7 copy 1 (add)
    with BuildSketch(Plane(origin=(0, -38.25, 0), x_dir=(-1, 0, 0), z_dir=(0, 1, 0))):
        with Locations((52.26, 16.25)):
            Rectangle(MIRROR7_COPY_1_SKETCH_W, MIRROR7_COPY_1_SKETCH_H)
    extrude(amount=MIRROR7_COPY_1_DEPTH)

    # Sketch15 → Cut-Extrude5 (cut)
    with BuildSketch(Plane(origin=(59.76, 0, 0), x_dir=(0, 0, -1), z_dir=(1, 0, 0))):
        with Locations((-6.4, 37.5)):
            Circle(SKETCH15_R)
        with Locations((-23.4, 37.5)):
            Circle(SKETCH15_R)
    cut_extrude5 = extrude(amount=-CUT_EXTRUDE5_DEPTH, mode=Mode.SUBTRACT)

    # Mirror8: Cut-Extrude5 across plane
    add(cut_extrude5.mirror(Plane.ZX), mode=Mode.SUBTRACT)

    # Mirror8 at the second plane: Cut-Extrude5 across plane
    add(cut_extrude5.mirror(Plane(origin=(0, 0, 0), x_dir=(0, 0, 1), z_dir=(1, 0, 0))), mode=Mode.SUBTRACT)

    # Mirror8 at the second plane copy 1 sketc → Mirror8 at the second plane copy 1 (cut)
    with BuildSketch(Plane(origin=(-59.76, 0, 0), x_dir=(0, 0, -1), z_dir=(-1, 0, 0))):
        with Locations((-6.4, 37.5)):
            Circle(MIRROR8_AT_THE_SECOND_PLANE_COPY_1_SKETC_R)
        with Locations((-23.4, 37.5)):
            Circle(MIRROR8_AT_THE_SECOND_PLANE_COPY_1_SKETC_R)
    extrude(amount=-MIRROR8_AT_THE_SECOND_PLANE_COPY_1_DEPTH, mode=Mode.SUBTRACT)

    # Sketch17 → Cut-Extrude6 (cut)
    with BuildSketch(Plane(origin=(59.76, 0, 0), x_dir=(0, 0, -1), z_dir=(1, 0, 0))):
        with Locations((5.5, -37.5)):
            Circle(SKETCH17_R)
    extrude(amount=-CUT_EXTRUDE6_DEPTH, mode=Mode.SUBTRACT)

    # Sketch18 → Cut-Extrude7 (cut)
    with BuildSketch(Plane(origin=(-54.86, 0, 0), x_dir=(0, 0, -1), z_dir=(1, 0, 0))):
        with Locations((5.5, -37.5)):
            Circle(SKETCH18_R)
    extrude(amount=-CUT_EXTRUDE7_DEPTH, mode=Mode.SUBTRACT)

    # Sketch19 → Cut-Extrude8 (cut)
    with BuildSketch(Plane(origin=(0, 43.25, 0), x_dir=(1, 0, 0), z_dir=(0, 1, 0))):
        with Locations((-37.26, -14.5)):
            Rectangle(SKETCH19_W, SKETCH19_H)
    cut_extrude8 = extrude(amount=-CUT_EXTRUDE8_DEPTH, mode=Mode.SUBTRACT)

    # Fillet2
    fillet2_edges = [part.edges().sort_by_distance(p)[0] for p in [
        (-44.76, 40.75, 22),
        (-44.76, 40.75, 7),
        (-29.76, 40.75, 7),
        (-29.76, 40.75, 22),
    ]]
    fillet(fillet2_edges, radius=FILLET2_R)

    # Mirror10: Cut-Extrude8 across plane
    add(cut_extrude8.mirror(Plane(origin=(0, 0, 0), x_dir=(0, 0, 1), z_dir=(1, 0, 0))), mode=Mode.SUBTRACT)

    # Fillet2 of Mirror10
    fillet2_of_mirror10_edges = [part.edges().sort_by_distance(p)[0] for p in [
        (44.76, 40.75, 22),
        (44.76, 40.75, 7),
        (29.76, 40.75, 7),
        (29.76, 40.75, 22),
    ]]
    fillet(fillet2_of_mirror10_edges, radius=FILLET2_OF_MIRROR10_R)

    # Sketch20 → Boss-Extrude11 (add)
    with BuildSketch(Plane.XZ.offset(43.25)):
        Polygon((-56.780616019, 85.74), (57.26, 85.74), (57.26, 30), (59.76, 30), (59.76, 0), (59.76, -8.5), (54.86, -8.5), (54.86, 0), (-54.86, 0), (-54.86, -8.5), (-59.76, -8.5), (-59.76, 0), (-59.76, 30), (-56.780616019, 30), align=None)
    extrude(amount=BOSS_EXTRUDE11_DEPTH)

    # Fillet3
    fillet3_edges = [part.edges().sort_by_distance(p)[0] for p in [
        (-56.780616019, -47.5, 85.74),
        (57.26, -47.5, 85.74),
    ]]
    fillet(fillet3_edges, radius=FILLET3_R)


solid = part.part
